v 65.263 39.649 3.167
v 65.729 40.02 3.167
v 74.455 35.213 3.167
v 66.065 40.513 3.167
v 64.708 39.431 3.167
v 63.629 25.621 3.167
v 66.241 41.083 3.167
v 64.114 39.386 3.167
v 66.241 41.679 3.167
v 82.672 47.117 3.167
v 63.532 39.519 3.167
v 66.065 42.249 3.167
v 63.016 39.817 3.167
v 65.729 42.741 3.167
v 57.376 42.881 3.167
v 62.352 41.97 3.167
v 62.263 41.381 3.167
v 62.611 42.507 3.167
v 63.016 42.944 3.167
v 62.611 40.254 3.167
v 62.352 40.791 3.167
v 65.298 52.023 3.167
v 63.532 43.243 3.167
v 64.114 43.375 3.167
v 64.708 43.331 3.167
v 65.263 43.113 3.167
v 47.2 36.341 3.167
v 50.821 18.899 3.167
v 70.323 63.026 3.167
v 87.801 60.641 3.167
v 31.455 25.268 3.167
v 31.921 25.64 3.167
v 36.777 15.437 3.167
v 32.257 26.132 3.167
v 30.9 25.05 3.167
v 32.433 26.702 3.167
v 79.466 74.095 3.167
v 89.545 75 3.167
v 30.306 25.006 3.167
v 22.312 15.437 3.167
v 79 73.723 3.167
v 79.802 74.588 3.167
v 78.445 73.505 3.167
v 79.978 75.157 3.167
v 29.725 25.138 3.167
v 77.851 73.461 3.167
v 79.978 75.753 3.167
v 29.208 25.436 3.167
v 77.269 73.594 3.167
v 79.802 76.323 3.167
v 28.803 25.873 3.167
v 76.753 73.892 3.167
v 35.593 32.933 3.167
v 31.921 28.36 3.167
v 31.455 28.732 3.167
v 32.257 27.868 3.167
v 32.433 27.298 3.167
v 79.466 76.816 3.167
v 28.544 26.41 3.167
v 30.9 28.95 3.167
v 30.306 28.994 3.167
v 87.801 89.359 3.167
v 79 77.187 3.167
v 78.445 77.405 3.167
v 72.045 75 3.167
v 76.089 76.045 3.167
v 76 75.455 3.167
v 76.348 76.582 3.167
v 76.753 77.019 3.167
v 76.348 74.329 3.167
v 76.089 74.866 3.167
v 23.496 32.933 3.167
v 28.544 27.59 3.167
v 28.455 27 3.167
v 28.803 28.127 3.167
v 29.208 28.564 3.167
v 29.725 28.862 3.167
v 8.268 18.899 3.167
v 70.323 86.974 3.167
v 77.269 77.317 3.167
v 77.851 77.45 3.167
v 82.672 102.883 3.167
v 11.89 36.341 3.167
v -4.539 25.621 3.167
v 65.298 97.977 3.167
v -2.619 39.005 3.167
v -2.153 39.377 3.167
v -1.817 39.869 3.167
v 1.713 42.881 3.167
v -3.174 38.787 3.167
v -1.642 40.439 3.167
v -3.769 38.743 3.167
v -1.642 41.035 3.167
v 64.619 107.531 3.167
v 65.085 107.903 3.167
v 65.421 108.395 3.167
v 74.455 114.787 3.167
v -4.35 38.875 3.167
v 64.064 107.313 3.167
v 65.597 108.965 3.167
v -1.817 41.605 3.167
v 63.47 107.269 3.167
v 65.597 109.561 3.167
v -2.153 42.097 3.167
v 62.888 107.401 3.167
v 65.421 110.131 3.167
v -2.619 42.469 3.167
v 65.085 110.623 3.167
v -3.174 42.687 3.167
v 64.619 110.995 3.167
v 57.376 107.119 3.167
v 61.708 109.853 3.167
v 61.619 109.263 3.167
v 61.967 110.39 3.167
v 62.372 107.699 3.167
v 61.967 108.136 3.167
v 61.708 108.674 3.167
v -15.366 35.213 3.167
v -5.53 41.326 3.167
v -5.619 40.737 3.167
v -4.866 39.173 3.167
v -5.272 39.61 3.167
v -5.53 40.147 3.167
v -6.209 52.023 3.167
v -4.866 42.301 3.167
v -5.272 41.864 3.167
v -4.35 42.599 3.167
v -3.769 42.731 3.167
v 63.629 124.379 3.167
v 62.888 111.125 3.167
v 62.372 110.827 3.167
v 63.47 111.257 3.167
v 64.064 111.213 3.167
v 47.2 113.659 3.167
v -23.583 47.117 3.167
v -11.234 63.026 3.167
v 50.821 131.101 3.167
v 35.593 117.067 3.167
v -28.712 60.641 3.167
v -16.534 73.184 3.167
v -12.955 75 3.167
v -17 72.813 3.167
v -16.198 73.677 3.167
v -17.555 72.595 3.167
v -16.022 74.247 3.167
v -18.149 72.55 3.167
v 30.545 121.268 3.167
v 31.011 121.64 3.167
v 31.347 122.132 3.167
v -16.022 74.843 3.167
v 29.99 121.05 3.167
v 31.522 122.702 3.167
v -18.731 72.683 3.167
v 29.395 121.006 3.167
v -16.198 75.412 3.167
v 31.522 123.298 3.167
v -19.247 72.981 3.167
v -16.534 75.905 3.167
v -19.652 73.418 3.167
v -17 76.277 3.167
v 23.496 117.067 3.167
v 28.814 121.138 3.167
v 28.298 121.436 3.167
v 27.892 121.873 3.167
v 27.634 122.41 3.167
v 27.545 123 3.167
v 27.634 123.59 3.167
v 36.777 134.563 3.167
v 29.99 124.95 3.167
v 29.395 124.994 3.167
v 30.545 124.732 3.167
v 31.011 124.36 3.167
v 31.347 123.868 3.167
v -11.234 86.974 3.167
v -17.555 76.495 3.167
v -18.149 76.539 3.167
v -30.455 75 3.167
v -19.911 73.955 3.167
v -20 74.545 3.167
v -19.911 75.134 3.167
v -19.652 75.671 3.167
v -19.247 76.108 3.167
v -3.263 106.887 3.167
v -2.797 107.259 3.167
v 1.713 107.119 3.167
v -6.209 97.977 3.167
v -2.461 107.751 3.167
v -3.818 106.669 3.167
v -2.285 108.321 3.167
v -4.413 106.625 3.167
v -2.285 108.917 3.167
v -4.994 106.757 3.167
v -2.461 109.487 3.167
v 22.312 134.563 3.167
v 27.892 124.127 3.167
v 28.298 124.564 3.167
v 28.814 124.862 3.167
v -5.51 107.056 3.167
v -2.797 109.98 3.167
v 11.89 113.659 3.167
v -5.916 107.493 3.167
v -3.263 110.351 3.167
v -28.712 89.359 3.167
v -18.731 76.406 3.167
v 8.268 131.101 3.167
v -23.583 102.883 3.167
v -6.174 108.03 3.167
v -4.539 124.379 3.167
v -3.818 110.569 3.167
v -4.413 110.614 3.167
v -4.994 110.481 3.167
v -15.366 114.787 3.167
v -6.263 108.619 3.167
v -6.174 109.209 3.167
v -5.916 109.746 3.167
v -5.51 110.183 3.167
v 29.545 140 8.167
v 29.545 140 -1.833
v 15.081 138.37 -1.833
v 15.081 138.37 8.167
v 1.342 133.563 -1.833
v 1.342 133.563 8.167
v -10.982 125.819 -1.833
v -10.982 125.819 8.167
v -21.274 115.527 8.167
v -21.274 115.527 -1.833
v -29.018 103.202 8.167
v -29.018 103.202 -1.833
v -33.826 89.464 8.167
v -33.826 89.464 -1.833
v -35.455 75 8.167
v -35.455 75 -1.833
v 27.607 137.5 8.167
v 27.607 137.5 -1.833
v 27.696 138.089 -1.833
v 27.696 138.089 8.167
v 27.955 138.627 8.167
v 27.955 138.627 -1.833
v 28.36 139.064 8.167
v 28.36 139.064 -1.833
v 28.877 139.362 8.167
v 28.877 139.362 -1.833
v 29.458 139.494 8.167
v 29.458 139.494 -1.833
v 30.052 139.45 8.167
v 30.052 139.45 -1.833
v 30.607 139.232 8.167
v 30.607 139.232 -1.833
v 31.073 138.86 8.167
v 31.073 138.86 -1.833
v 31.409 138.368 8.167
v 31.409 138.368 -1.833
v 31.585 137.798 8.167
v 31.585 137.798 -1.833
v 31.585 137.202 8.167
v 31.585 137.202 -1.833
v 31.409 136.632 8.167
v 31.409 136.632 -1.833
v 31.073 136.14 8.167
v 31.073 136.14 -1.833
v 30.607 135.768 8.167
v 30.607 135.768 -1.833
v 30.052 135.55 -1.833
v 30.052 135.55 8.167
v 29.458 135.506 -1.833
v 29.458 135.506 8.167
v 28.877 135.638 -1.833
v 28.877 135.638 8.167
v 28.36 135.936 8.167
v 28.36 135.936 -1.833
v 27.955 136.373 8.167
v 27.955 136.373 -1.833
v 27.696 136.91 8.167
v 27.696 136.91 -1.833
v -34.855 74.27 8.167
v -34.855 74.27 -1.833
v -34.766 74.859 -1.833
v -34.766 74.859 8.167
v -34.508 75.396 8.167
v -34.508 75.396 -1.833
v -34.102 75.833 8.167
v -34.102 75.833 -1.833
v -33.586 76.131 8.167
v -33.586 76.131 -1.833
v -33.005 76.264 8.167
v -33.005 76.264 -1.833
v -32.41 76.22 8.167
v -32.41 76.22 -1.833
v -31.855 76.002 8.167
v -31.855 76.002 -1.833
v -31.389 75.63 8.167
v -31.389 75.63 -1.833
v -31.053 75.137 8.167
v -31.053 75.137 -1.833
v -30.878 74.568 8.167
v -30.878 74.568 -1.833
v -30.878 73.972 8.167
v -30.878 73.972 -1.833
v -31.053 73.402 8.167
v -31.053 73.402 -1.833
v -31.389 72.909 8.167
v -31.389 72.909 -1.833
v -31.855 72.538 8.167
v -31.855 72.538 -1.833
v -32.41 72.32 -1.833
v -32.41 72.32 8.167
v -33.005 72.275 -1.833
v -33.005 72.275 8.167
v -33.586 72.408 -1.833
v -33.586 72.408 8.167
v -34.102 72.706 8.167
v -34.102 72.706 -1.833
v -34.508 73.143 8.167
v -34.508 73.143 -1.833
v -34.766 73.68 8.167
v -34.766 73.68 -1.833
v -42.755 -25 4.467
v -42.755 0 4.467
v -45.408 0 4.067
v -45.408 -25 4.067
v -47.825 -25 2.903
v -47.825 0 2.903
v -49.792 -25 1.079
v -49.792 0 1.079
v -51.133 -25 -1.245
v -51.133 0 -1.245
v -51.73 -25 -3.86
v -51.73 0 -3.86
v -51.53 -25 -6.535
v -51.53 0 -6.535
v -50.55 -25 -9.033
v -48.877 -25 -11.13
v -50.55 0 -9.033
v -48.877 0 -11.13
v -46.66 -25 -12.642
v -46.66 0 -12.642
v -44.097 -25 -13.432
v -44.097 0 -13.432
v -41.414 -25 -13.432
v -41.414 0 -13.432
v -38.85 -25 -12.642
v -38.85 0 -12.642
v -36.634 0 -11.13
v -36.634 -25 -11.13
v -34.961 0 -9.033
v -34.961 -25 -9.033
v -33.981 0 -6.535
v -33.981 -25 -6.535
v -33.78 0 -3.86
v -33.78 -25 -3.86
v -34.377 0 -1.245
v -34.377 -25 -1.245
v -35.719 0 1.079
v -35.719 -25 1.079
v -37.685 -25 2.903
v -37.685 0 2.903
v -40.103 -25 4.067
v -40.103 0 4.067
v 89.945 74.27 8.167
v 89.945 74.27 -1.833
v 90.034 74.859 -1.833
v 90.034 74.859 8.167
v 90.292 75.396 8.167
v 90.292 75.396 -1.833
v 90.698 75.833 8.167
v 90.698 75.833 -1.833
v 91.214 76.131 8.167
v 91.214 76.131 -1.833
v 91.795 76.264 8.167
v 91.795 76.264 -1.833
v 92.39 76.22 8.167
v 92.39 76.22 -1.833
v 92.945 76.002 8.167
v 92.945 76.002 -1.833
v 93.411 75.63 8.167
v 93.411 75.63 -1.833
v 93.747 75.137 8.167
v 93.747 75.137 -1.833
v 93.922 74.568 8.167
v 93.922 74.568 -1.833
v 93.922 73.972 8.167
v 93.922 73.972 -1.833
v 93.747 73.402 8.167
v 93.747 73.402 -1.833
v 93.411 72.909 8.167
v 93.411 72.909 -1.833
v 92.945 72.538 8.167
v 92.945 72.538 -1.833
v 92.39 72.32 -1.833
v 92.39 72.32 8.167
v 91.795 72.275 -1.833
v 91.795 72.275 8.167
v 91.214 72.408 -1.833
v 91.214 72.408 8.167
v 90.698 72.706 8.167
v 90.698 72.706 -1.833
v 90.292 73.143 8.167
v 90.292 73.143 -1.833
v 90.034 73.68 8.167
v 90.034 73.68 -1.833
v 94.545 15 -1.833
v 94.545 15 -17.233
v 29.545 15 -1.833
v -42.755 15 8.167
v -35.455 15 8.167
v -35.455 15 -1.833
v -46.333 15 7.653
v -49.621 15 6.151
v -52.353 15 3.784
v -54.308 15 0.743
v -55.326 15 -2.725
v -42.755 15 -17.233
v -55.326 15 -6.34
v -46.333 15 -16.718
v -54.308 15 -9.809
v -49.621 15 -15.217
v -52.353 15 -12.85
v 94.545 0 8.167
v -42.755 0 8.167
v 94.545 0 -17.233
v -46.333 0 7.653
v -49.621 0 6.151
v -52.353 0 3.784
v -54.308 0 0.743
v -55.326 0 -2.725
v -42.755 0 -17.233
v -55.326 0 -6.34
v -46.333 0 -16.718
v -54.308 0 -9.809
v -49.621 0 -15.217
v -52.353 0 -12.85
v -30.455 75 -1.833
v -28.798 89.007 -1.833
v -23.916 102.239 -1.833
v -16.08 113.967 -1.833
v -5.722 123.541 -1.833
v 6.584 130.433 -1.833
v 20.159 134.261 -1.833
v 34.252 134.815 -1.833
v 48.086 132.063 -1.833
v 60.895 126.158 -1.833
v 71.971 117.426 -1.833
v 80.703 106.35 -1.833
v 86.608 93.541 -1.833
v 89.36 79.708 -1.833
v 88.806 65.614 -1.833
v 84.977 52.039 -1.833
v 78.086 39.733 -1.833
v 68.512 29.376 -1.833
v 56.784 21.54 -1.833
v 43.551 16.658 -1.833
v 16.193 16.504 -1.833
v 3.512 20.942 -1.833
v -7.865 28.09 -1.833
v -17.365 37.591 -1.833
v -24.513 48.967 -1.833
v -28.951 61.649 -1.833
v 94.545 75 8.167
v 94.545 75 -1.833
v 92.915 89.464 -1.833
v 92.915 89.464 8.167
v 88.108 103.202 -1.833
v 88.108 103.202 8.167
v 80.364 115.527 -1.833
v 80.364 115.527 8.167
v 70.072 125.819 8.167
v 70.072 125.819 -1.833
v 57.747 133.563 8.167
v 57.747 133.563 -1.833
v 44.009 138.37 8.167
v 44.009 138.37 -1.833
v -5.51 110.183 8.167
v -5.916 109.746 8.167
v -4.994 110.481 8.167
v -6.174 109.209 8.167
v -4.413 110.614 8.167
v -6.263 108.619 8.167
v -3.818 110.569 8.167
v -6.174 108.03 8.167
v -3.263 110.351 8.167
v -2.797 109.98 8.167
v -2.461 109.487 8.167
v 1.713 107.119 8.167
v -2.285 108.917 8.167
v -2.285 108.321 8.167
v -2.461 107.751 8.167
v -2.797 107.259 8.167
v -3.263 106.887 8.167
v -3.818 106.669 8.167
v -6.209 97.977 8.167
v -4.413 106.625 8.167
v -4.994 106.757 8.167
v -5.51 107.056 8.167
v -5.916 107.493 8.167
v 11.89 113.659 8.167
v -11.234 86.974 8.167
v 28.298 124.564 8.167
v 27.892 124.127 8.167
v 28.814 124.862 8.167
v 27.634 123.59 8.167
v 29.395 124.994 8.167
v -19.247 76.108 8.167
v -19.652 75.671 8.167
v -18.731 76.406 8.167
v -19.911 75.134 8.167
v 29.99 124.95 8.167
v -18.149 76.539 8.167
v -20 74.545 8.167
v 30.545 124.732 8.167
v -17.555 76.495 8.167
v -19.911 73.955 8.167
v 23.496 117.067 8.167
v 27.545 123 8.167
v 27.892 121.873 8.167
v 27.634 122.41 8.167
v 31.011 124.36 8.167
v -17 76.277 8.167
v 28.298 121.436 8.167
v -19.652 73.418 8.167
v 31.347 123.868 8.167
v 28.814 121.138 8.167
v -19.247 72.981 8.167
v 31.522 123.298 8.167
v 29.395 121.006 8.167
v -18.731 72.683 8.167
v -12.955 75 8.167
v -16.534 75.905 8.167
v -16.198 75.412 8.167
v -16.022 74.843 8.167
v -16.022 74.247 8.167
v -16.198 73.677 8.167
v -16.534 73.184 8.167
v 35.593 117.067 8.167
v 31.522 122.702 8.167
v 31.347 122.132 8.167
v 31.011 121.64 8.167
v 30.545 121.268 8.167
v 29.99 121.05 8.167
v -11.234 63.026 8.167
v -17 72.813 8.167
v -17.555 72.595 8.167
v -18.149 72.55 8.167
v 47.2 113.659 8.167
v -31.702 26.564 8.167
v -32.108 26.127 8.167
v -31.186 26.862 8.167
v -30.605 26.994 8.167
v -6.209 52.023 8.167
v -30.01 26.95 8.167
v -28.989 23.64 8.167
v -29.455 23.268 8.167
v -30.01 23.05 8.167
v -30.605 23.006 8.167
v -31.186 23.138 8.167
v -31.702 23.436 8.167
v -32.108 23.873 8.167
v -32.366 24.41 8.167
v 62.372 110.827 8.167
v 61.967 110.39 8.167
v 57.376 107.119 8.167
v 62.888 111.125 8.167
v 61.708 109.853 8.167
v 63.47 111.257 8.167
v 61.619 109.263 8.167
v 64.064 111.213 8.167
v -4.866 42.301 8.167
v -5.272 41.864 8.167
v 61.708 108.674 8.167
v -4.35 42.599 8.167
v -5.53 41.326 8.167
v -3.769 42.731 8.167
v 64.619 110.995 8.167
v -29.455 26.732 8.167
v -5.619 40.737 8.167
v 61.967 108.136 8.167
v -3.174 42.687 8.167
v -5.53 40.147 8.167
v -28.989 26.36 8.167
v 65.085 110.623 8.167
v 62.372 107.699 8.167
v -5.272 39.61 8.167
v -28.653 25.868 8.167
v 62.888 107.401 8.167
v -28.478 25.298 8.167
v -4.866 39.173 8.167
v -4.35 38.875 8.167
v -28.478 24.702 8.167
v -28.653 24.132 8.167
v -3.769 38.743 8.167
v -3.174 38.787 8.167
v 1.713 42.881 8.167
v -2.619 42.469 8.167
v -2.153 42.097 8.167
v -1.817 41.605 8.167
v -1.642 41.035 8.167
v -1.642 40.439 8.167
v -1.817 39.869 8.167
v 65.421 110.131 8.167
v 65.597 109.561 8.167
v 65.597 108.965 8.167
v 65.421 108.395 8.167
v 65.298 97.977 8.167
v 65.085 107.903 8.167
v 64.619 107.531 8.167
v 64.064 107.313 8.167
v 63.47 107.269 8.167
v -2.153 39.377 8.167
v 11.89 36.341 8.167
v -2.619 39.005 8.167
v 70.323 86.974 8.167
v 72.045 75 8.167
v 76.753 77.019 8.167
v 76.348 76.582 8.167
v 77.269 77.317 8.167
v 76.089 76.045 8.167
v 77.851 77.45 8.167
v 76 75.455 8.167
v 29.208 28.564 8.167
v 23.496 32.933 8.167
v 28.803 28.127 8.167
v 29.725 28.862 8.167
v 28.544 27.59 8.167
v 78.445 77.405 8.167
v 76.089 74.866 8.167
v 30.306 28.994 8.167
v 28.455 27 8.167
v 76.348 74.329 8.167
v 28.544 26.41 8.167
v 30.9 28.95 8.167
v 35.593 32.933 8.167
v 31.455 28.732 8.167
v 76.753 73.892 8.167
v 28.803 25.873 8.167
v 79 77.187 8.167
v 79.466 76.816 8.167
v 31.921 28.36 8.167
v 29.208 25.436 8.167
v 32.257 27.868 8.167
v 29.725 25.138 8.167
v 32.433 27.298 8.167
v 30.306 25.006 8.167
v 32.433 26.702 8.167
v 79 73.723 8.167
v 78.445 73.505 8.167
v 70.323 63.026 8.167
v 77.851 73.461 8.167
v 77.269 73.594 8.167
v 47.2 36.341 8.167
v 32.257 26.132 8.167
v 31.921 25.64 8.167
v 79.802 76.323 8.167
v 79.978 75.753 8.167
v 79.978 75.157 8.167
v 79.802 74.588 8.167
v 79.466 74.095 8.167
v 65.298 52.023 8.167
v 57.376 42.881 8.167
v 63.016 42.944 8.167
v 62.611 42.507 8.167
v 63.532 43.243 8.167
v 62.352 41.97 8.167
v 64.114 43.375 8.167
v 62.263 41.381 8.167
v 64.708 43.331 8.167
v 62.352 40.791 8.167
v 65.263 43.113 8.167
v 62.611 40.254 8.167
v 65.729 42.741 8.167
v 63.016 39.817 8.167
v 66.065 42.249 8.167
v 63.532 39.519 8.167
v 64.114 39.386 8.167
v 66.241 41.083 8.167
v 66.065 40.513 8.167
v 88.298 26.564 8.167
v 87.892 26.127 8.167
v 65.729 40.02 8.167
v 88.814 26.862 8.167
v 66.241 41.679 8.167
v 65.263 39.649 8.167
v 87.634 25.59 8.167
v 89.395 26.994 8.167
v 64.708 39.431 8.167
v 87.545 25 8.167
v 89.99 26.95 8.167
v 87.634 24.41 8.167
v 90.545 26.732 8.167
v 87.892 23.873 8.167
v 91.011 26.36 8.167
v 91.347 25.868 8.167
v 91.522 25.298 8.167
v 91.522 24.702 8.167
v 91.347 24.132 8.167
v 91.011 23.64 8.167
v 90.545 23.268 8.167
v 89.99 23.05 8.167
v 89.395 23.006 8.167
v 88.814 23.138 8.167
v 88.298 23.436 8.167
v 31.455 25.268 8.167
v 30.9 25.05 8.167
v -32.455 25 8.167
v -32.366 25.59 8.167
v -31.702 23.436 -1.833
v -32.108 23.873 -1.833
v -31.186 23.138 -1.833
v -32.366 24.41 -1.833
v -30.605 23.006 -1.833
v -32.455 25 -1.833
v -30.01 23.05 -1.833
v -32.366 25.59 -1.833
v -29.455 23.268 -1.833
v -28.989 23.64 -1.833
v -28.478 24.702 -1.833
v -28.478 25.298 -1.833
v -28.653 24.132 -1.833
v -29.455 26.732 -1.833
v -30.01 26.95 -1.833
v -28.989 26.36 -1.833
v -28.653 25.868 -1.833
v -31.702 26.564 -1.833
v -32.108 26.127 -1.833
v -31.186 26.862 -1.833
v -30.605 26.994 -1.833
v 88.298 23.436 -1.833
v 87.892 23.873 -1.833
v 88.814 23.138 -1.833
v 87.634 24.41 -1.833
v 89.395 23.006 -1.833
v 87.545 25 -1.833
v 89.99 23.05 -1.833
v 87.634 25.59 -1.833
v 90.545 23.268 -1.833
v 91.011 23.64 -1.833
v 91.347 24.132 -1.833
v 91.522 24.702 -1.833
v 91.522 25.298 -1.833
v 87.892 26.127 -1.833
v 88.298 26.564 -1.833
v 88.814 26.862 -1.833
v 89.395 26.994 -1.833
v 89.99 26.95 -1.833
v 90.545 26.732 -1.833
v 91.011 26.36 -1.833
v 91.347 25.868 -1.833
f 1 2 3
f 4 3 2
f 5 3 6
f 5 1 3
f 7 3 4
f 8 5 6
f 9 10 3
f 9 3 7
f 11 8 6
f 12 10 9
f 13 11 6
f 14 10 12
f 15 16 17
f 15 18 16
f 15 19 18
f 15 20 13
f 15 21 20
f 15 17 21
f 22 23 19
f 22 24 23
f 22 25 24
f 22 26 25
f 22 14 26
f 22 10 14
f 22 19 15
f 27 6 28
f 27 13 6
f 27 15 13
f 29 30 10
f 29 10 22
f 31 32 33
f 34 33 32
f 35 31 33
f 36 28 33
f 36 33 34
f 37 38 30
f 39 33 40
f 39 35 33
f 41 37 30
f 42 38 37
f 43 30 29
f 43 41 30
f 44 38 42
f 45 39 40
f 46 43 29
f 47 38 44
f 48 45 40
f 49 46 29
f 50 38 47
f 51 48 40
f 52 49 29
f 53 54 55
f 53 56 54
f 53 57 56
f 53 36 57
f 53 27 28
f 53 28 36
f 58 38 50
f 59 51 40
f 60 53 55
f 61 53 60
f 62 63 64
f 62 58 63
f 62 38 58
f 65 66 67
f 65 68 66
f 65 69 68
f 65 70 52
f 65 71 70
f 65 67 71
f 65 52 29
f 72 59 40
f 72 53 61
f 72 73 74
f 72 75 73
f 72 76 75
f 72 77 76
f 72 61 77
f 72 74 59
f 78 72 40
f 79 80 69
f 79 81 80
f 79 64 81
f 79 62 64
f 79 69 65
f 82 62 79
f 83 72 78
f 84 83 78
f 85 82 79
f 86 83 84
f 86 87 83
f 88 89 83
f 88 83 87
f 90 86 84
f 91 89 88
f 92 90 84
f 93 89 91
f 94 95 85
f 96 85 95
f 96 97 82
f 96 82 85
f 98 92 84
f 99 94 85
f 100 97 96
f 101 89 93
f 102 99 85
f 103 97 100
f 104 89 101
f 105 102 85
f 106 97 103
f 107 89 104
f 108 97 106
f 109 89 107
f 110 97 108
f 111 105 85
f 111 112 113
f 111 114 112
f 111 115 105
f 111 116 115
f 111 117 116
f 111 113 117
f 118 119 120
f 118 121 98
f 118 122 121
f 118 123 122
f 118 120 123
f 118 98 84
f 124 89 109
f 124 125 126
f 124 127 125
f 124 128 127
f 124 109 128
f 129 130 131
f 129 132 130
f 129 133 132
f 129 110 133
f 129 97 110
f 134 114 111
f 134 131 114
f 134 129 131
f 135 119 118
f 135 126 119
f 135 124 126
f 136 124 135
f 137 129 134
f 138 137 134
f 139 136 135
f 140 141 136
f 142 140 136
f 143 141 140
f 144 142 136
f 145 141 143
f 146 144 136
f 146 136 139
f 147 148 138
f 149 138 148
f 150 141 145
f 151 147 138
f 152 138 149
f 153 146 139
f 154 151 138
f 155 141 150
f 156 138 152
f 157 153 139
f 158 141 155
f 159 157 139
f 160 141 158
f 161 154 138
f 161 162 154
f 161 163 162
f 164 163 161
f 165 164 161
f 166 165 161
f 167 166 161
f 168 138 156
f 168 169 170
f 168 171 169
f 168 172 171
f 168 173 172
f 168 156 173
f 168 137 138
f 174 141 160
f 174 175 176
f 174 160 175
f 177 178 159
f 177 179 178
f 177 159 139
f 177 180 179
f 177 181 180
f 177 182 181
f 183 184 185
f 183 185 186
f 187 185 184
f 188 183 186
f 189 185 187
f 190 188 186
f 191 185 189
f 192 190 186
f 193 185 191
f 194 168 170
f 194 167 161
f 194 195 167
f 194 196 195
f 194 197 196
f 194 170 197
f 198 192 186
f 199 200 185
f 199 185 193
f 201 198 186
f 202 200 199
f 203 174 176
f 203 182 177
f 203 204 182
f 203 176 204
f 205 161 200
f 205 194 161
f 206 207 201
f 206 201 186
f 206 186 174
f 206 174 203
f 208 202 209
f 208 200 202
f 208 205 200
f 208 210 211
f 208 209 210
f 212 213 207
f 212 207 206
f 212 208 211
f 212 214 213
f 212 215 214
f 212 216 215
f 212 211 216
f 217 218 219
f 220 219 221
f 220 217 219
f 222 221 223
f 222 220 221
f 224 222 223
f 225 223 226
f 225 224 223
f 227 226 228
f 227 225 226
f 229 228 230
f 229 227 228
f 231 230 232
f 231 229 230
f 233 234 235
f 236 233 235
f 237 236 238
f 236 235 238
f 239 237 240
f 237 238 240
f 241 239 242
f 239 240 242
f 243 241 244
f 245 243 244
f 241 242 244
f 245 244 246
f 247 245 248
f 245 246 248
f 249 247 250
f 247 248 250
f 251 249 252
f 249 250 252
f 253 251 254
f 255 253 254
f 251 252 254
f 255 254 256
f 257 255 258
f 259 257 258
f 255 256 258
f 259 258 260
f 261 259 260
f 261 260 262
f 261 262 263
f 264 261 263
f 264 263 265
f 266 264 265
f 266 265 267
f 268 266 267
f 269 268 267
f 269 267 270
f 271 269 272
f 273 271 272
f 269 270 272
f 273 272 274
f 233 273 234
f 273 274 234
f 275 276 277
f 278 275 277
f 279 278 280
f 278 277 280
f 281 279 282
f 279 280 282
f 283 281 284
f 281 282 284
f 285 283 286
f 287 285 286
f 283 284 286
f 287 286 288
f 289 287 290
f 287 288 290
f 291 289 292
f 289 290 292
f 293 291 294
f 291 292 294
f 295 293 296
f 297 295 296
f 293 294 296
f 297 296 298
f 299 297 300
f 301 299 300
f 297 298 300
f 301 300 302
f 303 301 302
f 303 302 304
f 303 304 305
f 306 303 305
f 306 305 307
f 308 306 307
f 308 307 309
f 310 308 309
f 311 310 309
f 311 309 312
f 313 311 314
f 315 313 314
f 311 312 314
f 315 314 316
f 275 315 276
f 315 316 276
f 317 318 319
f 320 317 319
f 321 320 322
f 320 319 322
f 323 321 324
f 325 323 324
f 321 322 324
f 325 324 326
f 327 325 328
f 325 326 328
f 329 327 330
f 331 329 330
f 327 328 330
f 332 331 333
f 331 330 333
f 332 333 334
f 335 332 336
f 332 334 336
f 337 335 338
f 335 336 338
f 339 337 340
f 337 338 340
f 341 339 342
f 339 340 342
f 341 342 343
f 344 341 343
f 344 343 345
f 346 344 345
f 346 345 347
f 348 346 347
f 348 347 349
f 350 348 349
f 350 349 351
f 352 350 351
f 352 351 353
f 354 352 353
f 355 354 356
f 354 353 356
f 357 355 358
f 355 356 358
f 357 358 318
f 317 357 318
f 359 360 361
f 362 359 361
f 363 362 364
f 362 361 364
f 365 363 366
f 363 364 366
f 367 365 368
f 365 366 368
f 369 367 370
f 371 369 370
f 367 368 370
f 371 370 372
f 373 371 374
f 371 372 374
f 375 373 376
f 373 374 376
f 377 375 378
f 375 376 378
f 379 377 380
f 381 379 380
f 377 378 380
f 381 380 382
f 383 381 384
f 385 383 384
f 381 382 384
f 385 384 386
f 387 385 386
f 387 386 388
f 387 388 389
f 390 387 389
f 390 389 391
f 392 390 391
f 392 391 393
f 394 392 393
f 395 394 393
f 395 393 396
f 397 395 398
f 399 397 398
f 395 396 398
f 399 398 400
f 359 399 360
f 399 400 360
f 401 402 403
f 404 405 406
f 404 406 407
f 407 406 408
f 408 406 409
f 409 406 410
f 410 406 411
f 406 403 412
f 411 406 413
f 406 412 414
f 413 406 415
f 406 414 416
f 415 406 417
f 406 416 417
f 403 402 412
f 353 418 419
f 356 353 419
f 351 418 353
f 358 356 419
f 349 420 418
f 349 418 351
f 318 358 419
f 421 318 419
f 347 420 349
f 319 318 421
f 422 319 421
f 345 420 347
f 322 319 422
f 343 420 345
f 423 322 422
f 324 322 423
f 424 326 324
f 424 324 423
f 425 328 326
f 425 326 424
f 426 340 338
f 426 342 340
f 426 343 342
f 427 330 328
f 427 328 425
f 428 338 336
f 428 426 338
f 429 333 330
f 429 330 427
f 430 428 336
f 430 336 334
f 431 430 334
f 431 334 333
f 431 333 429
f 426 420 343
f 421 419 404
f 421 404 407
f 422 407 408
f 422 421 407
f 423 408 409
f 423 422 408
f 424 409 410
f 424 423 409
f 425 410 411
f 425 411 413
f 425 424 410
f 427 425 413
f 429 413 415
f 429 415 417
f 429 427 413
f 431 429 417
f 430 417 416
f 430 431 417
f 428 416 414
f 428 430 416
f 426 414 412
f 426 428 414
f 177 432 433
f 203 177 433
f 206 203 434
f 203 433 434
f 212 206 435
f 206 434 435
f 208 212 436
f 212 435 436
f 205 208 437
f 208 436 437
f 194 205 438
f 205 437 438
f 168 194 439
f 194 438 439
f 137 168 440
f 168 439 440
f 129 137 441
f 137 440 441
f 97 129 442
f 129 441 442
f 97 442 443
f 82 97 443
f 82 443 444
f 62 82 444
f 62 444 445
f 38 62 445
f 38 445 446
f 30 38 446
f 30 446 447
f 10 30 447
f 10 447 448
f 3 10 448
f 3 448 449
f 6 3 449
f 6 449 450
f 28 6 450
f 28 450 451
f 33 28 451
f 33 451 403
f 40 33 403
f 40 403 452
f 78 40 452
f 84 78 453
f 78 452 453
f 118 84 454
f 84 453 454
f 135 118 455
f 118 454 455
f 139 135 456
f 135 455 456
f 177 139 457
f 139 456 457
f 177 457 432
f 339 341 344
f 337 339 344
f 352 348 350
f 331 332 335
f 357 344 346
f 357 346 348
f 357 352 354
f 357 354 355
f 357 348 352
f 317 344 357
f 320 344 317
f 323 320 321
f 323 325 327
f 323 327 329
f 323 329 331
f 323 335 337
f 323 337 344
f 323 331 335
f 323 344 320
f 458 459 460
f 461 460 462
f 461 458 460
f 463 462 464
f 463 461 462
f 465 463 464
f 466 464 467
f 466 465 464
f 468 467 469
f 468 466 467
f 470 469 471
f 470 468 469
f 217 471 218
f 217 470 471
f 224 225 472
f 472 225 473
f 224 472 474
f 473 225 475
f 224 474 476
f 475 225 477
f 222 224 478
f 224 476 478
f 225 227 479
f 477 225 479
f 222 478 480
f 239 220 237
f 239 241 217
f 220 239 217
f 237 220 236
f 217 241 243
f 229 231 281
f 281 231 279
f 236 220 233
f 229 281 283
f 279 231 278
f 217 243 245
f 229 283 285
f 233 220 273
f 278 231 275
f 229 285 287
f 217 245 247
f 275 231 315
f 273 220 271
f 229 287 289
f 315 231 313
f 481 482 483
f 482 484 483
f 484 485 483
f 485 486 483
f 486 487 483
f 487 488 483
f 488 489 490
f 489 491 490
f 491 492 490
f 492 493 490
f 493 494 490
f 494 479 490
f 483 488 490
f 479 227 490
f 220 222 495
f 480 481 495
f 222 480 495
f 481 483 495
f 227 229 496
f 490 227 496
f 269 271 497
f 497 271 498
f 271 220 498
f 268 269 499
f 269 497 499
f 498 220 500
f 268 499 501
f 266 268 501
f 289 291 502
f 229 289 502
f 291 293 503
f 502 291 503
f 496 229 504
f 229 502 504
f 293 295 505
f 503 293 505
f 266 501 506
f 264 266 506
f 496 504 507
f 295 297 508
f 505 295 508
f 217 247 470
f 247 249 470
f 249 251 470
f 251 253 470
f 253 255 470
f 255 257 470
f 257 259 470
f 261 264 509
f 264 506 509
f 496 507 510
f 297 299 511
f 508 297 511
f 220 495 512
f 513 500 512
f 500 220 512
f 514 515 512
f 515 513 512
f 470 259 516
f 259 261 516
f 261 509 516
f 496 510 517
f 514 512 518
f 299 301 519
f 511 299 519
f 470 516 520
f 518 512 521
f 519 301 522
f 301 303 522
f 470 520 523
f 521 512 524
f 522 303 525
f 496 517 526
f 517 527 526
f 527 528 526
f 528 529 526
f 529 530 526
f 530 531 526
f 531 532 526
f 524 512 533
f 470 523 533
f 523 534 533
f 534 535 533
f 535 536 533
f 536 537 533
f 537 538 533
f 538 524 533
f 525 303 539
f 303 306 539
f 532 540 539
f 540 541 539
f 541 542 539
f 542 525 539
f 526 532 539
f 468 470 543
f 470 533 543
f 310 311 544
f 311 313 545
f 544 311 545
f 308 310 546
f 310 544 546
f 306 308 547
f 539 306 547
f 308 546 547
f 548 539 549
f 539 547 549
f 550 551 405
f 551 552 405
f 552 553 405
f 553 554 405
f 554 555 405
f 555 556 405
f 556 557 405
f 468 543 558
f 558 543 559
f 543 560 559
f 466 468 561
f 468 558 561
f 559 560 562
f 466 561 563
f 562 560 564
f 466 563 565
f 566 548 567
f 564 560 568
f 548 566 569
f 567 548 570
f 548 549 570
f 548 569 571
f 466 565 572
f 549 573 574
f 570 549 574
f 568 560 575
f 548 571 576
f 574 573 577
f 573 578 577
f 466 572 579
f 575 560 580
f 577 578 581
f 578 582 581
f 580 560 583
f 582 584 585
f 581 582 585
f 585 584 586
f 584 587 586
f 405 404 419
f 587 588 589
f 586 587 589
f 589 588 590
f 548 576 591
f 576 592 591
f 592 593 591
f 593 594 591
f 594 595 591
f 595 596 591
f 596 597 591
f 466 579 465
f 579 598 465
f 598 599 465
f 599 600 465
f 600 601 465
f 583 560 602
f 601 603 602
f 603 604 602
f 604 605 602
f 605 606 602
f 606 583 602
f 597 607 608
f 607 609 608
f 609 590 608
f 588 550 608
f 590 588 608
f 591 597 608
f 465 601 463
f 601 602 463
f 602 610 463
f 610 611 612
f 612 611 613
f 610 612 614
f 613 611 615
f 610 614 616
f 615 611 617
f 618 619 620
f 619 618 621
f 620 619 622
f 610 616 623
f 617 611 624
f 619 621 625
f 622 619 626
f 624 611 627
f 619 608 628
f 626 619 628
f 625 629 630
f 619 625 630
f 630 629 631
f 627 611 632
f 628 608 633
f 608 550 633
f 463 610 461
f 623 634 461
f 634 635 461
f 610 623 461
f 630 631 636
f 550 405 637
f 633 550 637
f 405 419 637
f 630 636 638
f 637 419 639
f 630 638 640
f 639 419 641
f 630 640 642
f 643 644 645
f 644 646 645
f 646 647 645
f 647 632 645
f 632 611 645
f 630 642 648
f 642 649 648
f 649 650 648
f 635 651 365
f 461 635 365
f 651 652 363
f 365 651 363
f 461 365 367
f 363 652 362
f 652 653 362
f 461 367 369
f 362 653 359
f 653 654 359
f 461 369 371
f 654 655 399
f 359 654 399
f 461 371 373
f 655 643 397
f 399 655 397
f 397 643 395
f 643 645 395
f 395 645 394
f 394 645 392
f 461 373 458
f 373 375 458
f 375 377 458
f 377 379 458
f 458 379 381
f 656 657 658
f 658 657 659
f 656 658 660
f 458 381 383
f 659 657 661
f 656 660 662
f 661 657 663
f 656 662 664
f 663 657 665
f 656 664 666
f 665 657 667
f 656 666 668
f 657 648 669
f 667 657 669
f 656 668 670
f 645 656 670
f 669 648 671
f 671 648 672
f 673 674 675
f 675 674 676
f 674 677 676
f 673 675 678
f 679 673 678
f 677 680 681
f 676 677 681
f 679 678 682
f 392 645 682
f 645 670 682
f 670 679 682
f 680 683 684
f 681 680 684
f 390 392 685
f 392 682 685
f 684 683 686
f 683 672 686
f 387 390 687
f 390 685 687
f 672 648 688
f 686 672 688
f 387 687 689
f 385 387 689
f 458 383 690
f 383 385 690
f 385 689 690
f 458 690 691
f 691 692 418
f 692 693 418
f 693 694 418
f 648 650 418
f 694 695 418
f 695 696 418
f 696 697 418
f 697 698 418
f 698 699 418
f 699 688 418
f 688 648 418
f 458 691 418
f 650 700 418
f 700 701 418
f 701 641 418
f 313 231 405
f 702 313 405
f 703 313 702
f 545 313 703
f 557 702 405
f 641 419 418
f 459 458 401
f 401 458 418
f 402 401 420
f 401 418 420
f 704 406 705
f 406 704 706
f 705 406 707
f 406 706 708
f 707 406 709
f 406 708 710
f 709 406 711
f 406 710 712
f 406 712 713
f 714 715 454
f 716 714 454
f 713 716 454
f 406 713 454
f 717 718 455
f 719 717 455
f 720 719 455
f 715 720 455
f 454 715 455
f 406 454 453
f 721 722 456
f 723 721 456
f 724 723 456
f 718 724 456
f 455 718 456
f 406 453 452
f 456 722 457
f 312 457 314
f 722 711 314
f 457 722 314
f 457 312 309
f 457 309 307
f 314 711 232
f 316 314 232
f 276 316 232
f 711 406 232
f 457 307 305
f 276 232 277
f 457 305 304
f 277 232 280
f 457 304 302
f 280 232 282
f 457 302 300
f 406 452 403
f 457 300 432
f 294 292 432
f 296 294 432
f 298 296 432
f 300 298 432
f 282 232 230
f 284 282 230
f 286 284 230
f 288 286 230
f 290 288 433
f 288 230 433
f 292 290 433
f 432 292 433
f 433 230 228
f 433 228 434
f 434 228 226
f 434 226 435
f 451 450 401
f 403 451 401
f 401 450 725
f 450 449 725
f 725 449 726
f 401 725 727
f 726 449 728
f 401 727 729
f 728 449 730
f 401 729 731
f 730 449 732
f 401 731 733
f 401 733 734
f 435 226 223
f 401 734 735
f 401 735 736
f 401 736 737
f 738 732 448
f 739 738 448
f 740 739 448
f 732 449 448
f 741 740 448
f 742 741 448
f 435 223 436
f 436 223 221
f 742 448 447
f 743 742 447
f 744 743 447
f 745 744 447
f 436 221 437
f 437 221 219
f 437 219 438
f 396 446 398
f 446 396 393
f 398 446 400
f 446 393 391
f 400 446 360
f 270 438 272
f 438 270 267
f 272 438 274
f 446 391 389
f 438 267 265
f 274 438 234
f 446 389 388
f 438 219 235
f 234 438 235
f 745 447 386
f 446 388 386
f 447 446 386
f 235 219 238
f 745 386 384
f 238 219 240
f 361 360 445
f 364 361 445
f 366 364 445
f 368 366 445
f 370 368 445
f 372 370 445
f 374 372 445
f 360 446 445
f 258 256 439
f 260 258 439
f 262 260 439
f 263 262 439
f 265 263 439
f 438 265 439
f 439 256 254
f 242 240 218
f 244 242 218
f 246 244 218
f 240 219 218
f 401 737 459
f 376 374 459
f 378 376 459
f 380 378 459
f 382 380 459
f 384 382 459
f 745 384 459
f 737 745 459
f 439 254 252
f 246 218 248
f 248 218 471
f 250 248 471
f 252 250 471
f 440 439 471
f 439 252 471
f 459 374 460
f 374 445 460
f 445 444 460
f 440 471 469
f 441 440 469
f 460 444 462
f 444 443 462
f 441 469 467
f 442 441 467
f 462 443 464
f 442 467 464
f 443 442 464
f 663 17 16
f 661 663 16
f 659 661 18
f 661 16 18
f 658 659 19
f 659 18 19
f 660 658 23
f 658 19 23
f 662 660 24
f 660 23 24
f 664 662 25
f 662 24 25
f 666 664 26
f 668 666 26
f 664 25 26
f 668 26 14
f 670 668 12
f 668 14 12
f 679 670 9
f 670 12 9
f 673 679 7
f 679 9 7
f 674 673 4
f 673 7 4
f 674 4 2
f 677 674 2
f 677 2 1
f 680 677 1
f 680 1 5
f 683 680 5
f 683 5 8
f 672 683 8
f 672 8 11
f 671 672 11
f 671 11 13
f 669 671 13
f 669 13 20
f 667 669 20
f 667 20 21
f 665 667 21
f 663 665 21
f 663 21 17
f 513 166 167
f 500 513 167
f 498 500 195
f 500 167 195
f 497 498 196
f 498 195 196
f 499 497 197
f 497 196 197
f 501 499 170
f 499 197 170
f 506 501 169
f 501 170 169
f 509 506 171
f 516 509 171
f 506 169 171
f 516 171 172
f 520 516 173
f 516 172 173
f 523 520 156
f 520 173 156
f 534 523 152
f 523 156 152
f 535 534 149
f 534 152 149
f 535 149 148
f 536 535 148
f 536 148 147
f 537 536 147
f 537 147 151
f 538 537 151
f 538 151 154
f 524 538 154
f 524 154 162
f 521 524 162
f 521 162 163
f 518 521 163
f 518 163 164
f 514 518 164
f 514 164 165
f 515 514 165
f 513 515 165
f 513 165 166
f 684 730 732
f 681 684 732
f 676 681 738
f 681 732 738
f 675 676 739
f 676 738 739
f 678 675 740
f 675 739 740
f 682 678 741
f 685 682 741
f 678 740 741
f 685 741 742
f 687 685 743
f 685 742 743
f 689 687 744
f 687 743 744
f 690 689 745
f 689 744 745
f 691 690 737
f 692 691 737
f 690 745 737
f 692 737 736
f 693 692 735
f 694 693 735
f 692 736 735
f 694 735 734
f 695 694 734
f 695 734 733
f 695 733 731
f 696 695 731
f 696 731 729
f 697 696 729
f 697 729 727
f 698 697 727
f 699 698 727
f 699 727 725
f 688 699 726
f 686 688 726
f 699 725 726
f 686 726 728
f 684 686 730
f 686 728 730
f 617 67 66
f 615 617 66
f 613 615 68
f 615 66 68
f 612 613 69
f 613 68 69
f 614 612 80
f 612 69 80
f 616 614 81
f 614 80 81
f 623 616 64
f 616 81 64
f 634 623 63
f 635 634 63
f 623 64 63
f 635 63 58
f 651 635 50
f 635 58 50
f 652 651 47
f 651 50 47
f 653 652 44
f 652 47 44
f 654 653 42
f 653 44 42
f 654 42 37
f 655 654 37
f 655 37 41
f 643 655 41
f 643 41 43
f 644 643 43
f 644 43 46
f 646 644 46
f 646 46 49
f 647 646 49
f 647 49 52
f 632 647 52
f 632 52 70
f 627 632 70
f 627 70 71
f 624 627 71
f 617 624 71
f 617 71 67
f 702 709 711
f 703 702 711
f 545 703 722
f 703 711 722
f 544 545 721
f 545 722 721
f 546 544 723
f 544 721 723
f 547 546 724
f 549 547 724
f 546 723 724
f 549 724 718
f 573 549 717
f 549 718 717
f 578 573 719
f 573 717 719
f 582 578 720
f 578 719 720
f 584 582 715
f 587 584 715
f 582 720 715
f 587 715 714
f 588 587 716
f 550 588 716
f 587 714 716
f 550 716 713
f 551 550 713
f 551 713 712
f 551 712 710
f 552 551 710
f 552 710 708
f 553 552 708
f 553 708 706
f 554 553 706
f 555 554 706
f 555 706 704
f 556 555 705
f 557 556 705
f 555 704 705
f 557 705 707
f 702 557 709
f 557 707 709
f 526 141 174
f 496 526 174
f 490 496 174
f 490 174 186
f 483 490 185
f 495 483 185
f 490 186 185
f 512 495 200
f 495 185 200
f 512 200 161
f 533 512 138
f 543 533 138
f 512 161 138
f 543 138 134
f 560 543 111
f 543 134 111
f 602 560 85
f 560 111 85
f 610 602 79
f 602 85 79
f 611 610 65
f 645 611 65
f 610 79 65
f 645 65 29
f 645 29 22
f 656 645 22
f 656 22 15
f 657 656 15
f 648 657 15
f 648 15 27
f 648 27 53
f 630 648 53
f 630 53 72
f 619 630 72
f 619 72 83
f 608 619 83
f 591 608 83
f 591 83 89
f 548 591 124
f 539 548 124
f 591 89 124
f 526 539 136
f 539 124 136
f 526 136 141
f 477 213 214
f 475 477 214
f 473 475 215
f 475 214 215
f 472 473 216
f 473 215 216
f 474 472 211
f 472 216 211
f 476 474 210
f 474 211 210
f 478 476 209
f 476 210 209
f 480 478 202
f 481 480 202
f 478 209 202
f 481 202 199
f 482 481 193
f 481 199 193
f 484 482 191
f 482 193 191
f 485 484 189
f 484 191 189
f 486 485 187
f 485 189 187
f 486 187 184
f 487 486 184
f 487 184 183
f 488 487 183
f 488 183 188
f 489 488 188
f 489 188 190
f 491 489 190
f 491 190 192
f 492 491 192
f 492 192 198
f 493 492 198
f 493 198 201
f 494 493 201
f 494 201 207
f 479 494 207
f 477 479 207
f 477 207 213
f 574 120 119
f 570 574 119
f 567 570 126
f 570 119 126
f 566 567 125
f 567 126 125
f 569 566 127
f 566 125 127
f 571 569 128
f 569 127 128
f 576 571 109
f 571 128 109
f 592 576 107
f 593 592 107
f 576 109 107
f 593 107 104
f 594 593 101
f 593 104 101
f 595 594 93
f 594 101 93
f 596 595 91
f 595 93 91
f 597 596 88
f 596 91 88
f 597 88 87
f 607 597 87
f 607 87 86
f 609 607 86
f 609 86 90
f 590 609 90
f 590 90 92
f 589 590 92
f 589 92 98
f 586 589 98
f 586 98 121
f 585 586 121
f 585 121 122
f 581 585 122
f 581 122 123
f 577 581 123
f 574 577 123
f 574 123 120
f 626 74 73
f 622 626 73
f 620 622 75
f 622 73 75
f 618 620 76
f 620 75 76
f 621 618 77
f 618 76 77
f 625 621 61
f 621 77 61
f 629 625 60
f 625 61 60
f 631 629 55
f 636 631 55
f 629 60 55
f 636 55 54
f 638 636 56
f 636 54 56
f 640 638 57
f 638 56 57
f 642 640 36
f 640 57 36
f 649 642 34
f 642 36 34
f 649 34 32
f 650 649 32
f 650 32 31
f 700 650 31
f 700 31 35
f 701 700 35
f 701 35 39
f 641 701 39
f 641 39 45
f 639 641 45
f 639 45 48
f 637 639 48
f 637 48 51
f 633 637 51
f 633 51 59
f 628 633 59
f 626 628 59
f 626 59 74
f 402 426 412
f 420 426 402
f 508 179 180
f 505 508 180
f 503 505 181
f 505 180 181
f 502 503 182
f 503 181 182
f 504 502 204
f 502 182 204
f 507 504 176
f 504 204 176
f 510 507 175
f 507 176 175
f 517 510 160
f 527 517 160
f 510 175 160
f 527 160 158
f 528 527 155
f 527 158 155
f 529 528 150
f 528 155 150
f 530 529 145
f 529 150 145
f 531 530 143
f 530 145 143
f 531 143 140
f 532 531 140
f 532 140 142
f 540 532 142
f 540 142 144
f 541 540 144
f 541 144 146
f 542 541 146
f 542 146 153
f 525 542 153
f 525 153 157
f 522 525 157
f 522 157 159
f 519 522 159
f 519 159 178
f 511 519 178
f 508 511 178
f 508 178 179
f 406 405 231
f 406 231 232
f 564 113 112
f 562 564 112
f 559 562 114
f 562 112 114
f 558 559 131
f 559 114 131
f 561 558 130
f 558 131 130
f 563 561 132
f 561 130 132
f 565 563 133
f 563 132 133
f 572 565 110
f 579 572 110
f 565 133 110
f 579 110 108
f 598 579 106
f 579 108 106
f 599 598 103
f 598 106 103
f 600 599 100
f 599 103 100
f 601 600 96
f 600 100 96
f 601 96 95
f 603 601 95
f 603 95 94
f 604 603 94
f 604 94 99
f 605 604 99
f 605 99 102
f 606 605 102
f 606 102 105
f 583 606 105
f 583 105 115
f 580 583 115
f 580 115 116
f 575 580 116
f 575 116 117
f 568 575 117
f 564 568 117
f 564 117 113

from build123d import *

# Parameters (mm, degrees)
BOSS_EXTRUDE1_DEPTH = 15
SKETCH2_R           = 9
BOSS_EXTRUDE2_DEPTH = 25
SKETCH3_W           = 130
SKETCH3_H           = 25.4
BOSS_EXTRUDE4_DEPTH = 125
CUT_EXTRUDE5_DEPTH  = 150
CUT_EXTRUDE6_DEPTH  = 15.4
SKETCH10_R          = 60
CUT_EXTRUDE9_DEPTH  = 5
SKETCH11_R          = 42.5
CUT_EXTRUDE10_DEPTH = 5
SKETCH12_R          = 2
CUT_EXTRUDE11_DEPTH = 10
SKETCH13_R          = 2
CUT_EXTRUDE12_DEPTH = 10
SKETCH14_R          = 2
CUT_EXTRUDE13_DEPTH = 10
SKETCH15_R          = 2
CUT_EXTRUDE14_DEPTH = 10


with BuildPart() as part:
    # Sketch1 → Boss-Extrude1 (new body)
    with BuildSketch(Plane(origin=(0, 0, 0), x_dir=(1, 0, 0), z_dir=(0, 1, 0))):
        with BuildLine():
            Line((-42.755305466, 17.232797428), (94.544694534, 17.232797428))
            Line((94.544694534, 17.232797428), (94.544694534, -8.167202572))
            Line((94.544694534, -8.167202572), (-42.755305466, -8.167202572))
            ThreePointArc((-42.755305466, -8.167202572), (-55.455305466, 4.532797428), (-42.755305466, 17.232797428))
        make_face()
    extrude(amount=BOSS_EXTRUDE1_DEPTH)

    # Sketch2 → Boss-Extrude2 (add)
    with BuildSketch(Plane.XZ):
        with Locations((-42.755305466, -4.532797428)):
            Circle(SKETCH2_R)
    extrude(amount=BOSS_EXTRUDE2_DEPTH)

    # Sketch3 → Boss-Extrude4 (add)
    with BuildSketch(Plane(origin=(0, 15, 0), x_dir=(1, 0, 0), z_dir=(0, 1, 0))):
        with Locations((29.544694534, 4.532797428)):
            Rectangle(SKETCH3_W, SKETCH3_H)
    extrude(amount=BOSS_EXTRUDE4_DEPTH)

    # Sketch6 → Cut-Extrude5 (cut)
    with BuildSketch(Plane(origin=(0, 0, -17.232797428), x_dir=(-1, 0, 0), z_dir=(0, 0, -1))):
        with BuildLine():
            Line((35.455305466, 140), (-29.544695, 140))
            ThreePointArc((-29.544695, 140), (16.417246079, 120.961940942), (35.455305466, 75))
            Line((35.455305466, 75), (35.455305466, 140))
        make_face()
        with BuildLine():
            Line((-29.544695, 140), (-94.544694534, 140))
            Line((-94.544694534, 140), (-94.544694534, 75))
            ThreePointArc((-94.544694534, 75), (-75.506635476, 120.961940612), (-29.544695, 140))
        make_face()
    extrude(amount=-CUT_EXTRUDE5_DEPTH, mode=Mode.SUBTRACT)

    # Sketch9 → Cut-Extrude6 (cut)
    with BuildSketch(Plane(origin=(0, 0, -17.232797428), x_dir=(-1, 0, 0), z_dir=(0, 0, -1))):
        with BuildLine():
            Line((35.455305466, 15), (-94.544694534, 15))
            Line((-94.544694534, 15), (-94.544694534, 75))
            ThreePointArc((-94.544694534, 75), (-29.544694534, 140), (35.455305466, 75))
            Line((35.455305466, 75), (35.455305466, 15))
        make_face()
    extrude(amount=-CUT_EXTRUDE6_DEPTH, mode=Mode.SUBTRACT)

    # Sketch10 → Cut-Extrude9 (cut)
    with BuildSketch(Plane(origin=(0, 0, -1.832797428), x_dir=(-1, 0, 0), z_dir=(0, 0, -1))):
        with Locations((-29.544694534, 75)):
            Circle(SKETCH10_R)
    extrude(amount=-CUT_EXTRUDE9_DEPTH, mode=Mode.SUBTRACT)

    # Sketch11 → Cut-Extrude10 (cut)
    with BuildSketch(Plane(origin=(0, 0, 3.167202572), x_dir=(-1, 0, 0), z_dir=(0, 0, -1))):
        with Locations((-29.544694534, 75)):
            Circle(SKETCH11_R)
    extrude(amount=-CUT_EXTRUDE10_DEPTH, mode=Mode.SUBTRACT)

    # Sketch12 → Cut-Extrude11 (cut)
    with BuildSketch(Plane(origin=(0, 0, 3.167202572), x_dir=(-1, 0, 0), z_dir=(0, 0, -1))):
        with Locations((-29.544694534, 123)):
            Circle(SKETCH12_R)
        with Locations((4.26307508, 108.619175914)):
            Circle(SKETCH12_R)
        with Locations((18, 74.544694534)):
            Circle(SKETCH12_R)
        with Locations((3.619175914, 40.73692492)):
            Circle(SKETCH12_R)
        with Locations((-30.455305466, 27)):
            Circle(SKETCH12_R)
        with Locations((-64.26307508, 41.380824086)):
            Circle(SKETCH12_R)
        with Locations((-78, 75.455305466)):
            Circle(SKETCH12_R)
        with Locations((-63.619175914, 109.26307508)):
            Circle(SKETCH12_R)
    extrude(amount=-CUT_EXTRUDE11_DEPTH, mode=Mode.SUBTRACT)

    # Sketch13 → Cut-Extrude12 (cut)
    with BuildSketch(Plane(origin=(0, 0, -1.832797428), x_dir=(-1, 0, 0), z_dir=(0, 0, -1))):
        with Locations((-89.544694534, 25)):
            Circle(SKETCH13_R)
        with Locations((30.455305466, 25)):
            Circle(SKETCH13_R)
    extrude(amount=-CUT_EXTRUDE12_DEPTH, mode=Mode.SUBTRACT)

    # Sketch14 → Cut-Extrude13 (cut)
    with BuildSketch(Plane(origin=(0, 0, -1.832797428), x_dir=(-1, 0, 0), z_dir=(0, 0, -1))):
        with Locations((-91.944694534, 74.269730636)):
            Circle(SKETCH14_R)
        with Locations((32.855305466, 74.269730636)):
            Circle(SKETCH14_R)
    extrude(amount=-CUT_EXTRUDE13_DEPTH, mode=Mode.SUBTRACT)

    # Sketch15 → Cut-Extrude14 (cut)
    with BuildSketch(Plane(origin=(0, 0, -1.832797428), x_dir=(-1, 0, 0), z_dir=(0, 0, -1))):
        with Locations((-29.607268832, 137.499968676)):
            Circle(SKETCH15_R)
    extrude(amount=-CUT_EXTRUDE14_DEPTH, mode=Mode.SUBTRACT)


solid = part.part
